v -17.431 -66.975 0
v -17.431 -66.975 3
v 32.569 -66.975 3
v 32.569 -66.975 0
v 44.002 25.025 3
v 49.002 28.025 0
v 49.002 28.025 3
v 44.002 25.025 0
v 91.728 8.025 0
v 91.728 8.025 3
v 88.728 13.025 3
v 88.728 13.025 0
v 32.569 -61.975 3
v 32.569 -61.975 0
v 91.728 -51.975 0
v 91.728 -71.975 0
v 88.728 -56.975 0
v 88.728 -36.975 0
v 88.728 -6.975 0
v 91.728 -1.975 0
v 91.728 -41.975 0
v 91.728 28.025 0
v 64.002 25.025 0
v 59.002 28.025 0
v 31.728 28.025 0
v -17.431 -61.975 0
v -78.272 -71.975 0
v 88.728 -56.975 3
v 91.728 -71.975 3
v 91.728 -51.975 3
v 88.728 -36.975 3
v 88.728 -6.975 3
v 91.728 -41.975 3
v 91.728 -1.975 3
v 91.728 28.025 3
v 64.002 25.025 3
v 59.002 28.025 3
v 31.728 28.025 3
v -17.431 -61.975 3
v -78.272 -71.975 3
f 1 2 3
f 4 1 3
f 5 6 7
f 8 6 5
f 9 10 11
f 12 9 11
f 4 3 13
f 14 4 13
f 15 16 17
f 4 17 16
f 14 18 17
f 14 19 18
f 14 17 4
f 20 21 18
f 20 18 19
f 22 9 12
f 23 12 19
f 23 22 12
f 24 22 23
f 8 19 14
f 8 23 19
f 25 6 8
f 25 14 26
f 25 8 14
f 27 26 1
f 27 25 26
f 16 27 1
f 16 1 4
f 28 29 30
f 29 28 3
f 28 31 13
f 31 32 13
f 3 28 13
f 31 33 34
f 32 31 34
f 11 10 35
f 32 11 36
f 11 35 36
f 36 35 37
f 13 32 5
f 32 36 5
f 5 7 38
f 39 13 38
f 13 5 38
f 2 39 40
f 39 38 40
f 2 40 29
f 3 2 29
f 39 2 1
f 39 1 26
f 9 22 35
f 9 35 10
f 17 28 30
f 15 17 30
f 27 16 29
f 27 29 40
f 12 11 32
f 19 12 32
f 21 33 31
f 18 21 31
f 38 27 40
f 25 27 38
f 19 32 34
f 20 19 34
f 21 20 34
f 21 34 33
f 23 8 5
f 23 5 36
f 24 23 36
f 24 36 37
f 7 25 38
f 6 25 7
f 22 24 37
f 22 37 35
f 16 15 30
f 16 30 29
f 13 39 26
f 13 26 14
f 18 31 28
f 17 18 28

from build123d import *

# Parameters (mm, degrees)
BOSS_EXTRU_1_DEPTH           = 3
ENL_V_MAT_EXTRU_1_DEPTH      = 117.633838487
ENL_V_MAT_EXTRU_1_DEPTH_BACK = 3
ENL_V_MAT_EXTRU_2_DEPTH      = 3
ESQUISSE4_W                  = 50
ESQUISSE4_H                  = 5
ENL_V_MAT_EXTRU_3_DEPTH      = 3


with BuildPart() as part:
    # Esquisse1 → Boss.-Extru.1 (new body)
    with BuildSketch(Plane.XY):
        Polygon((-78.272102247, -71.975308642), (31.727897753, 28.024691358), (91.727897753, 28.024691358), (91.727897753, -71.975308642), align=None)
    extrude(amount=BOSS_EXTRU_1_DEPTH)

    # Esquisse2 → Enlèv. mat.-Extru.1 (cut, two sides: drawn at the far end of the back side and taken through both)
    with BuildSketch(Plane.XY.offset(3).offset(-ENL_V_MAT_EXTRU_1_DEPTH_BACK)):
        Polygon((348.843028944, 207.929257012), (49.002086188, 28.024691358), (44.002086188, 25.024691358), (64.002086188, 25.024691358), (59.002086188, 28.024691358), (-240.838856568, 207.929257012), (-240.838856568, -491.413988315), (348.843028944, -491.413988315), align=None)
    extrude(amount=ENL_V_MAT_EXTRU_1_DEPTH + ENL_V_MAT_EXTRU_1_DEPTH_BACK, mode=Mode.SUBTRACT)

    # Esquisse3 → Enlèv. mat.-Extru.2 (cut)
    with BuildSketch(Plane.XY.offset(3)):
        Polygon((91.727897753, 8.024691358), (88.727897753, 13.024691358), (88.727897753, -6.975308642), (91.727897753, -1.975308642), align=None)
        Polygon((91.727897753, -41.975308642), (88.727897753, -36.975308642), (88.727897753, -56.975308642), (91.727897753, -51.975308642), align=None)
    extrude(amount=-ENL_V_MAT_EXTRU_2_DEPTH, mode=Mode.SUBTRACT)

    # Esquisse4 → Enlèv. mat.-Extru.3 (cut)
    with BuildSketch(Plane.XY.offset(3)):
        with Locations((7.568828052, -64.475308642)):
            Rectangle(ESQUISSE4_W, ESQUISSE4_H)
    extrude(amount=-ENL_V_MAT_EXTRU_3_DEPTH, mode=Mode.SUBTRACT)


solid = part.part
